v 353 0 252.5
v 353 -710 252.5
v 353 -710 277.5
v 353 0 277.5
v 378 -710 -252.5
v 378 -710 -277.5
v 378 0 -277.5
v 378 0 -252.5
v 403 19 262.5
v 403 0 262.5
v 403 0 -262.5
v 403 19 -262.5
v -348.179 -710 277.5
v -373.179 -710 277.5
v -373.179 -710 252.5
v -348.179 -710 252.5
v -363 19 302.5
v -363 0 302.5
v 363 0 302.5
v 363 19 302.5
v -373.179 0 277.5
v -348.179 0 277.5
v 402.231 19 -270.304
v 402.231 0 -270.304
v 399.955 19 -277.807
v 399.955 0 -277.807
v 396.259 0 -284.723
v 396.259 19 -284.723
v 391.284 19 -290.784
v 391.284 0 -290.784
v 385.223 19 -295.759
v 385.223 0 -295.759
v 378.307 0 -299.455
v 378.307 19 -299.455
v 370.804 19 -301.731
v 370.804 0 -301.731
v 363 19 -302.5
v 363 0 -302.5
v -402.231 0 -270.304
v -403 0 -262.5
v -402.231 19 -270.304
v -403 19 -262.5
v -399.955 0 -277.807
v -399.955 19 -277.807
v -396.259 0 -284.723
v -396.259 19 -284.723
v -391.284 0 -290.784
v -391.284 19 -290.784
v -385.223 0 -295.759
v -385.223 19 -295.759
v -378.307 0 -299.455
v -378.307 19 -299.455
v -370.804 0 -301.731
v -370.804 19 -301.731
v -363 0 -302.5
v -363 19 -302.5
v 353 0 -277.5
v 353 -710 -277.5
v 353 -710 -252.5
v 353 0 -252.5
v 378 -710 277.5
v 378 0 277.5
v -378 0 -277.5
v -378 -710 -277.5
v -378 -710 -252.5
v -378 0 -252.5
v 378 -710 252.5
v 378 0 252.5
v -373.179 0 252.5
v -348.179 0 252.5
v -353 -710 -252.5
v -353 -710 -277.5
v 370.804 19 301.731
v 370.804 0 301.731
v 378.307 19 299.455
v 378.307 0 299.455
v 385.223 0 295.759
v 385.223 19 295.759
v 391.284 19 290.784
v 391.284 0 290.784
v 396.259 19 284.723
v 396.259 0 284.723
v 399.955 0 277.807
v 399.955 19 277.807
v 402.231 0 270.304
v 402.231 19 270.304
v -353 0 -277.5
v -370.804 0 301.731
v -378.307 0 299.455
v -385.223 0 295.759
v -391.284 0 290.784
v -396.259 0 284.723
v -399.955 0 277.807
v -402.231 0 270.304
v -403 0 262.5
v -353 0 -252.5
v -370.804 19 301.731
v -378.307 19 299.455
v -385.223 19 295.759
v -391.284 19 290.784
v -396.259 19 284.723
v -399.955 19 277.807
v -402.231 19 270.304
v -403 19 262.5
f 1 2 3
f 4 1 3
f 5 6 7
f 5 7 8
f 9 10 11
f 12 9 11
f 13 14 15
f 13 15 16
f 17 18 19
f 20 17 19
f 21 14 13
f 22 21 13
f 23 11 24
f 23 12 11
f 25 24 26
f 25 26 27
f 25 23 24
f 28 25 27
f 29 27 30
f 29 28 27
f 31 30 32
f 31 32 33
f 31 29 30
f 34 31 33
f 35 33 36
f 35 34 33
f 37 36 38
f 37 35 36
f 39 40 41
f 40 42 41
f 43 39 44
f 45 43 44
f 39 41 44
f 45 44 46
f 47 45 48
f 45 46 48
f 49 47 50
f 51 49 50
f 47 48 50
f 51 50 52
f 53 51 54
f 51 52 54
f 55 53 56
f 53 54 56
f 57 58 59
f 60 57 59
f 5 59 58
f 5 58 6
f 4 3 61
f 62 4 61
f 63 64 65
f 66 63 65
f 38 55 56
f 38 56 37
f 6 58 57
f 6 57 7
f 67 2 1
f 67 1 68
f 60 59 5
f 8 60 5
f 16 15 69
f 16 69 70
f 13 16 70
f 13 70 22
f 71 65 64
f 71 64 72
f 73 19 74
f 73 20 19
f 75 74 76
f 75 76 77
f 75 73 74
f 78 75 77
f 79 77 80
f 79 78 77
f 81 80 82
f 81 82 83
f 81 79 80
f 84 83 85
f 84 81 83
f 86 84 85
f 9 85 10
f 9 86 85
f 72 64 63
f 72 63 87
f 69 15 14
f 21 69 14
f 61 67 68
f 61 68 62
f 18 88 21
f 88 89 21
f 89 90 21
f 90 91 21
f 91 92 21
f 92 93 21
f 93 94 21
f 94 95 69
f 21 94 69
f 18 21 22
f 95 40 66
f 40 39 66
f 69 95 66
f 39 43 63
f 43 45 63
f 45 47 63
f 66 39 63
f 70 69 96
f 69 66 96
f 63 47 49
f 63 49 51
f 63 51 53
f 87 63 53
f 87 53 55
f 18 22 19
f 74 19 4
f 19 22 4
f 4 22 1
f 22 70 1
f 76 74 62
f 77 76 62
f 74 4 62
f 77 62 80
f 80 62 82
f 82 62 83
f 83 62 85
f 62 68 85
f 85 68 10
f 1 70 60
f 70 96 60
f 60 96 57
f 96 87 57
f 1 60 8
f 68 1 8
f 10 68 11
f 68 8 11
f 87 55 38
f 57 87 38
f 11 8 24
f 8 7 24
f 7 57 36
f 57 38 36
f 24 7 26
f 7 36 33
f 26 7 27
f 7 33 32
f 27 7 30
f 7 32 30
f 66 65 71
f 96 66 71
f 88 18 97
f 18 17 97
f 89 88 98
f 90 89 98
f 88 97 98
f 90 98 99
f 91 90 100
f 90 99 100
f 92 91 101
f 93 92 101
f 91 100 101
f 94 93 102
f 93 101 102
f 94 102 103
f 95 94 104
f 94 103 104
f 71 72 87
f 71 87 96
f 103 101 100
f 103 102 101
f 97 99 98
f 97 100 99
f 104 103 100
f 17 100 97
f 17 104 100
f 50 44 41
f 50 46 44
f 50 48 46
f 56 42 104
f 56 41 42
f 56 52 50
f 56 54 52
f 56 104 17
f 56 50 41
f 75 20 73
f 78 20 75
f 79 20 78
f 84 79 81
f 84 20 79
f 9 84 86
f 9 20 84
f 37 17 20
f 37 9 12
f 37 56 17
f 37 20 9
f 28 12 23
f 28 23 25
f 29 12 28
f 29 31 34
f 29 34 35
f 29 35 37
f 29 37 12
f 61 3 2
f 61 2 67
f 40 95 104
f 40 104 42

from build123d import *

# Parameters (mm, degrees)
SKETCH2_W           = 806
SKETCH2_H           = 605
BOSS_EXTRUDE1_DEPTH = 19
SKETCH4_W           = 25
SKETCH4_H           = 25
BOSS_EXTRUDE3_DEPTH = 710
FILLET2_R           = 40
FILLET3_R           = 40
FILLET4_R           = 40


with BuildPart() as part:
    # Sketch2 → Boss-Extrude1 (new body)
    with BuildSketch(Plane(origin=(0, 0, 0), x_dir=(1, 0, 0), z_dir=(0, 1, 0))):
        Rectangle(SKETCH2_W, SKETCH2_H)
    extrude(amount=BOSS_EXTRUDE1_DEPTH)

    # Sketch4 → Boss-Extrude3 (add)
    with BuildSketch(Plane.XZ):
        with Locations((-360.678585118, 265)):
            Rectangle(SKETCH4_W, SKETCH4_H)
        with Locations((365.5, 265)):
            Rectangle(SKETCH4_W, SKETCH4_H)
        with Locations((365.5, -265)):
            Rectangle(SKETCH4_W, SKETCH4_H)
        with Locations((-365.5, -265)):
            Rectangle(SKETCH4_W, SKETCH4_H)
    extrude(amount=BOSS_EXTRUDE3_DEPTH)

    # Fillet2
    fillet2_edges = [part.edges().sort_by_distance(p)[0] for p in [
        (403, 9.5, 302.5),
    ]]
    fillet(fillet2_edges, radius=FILLET2_R)

    # Fillet3
    fillet3_edges = [part.edges().sort_by_distance(p)[0] for p in [
        (-403, 9.5, 302.5),
    ]]
    fillet(fillet3_edges, radius=FILLET3_R)

    # Fillet4
    fillet4_edges = [part.edges().sort_by_distance(p)[0] for p in [
        (-403, 9.5, -302.5),
        (403, 9.5, -302.5),
    ]]
    fillet(fillet4_edges, radius=FILLET4_R)


solid = part.part
